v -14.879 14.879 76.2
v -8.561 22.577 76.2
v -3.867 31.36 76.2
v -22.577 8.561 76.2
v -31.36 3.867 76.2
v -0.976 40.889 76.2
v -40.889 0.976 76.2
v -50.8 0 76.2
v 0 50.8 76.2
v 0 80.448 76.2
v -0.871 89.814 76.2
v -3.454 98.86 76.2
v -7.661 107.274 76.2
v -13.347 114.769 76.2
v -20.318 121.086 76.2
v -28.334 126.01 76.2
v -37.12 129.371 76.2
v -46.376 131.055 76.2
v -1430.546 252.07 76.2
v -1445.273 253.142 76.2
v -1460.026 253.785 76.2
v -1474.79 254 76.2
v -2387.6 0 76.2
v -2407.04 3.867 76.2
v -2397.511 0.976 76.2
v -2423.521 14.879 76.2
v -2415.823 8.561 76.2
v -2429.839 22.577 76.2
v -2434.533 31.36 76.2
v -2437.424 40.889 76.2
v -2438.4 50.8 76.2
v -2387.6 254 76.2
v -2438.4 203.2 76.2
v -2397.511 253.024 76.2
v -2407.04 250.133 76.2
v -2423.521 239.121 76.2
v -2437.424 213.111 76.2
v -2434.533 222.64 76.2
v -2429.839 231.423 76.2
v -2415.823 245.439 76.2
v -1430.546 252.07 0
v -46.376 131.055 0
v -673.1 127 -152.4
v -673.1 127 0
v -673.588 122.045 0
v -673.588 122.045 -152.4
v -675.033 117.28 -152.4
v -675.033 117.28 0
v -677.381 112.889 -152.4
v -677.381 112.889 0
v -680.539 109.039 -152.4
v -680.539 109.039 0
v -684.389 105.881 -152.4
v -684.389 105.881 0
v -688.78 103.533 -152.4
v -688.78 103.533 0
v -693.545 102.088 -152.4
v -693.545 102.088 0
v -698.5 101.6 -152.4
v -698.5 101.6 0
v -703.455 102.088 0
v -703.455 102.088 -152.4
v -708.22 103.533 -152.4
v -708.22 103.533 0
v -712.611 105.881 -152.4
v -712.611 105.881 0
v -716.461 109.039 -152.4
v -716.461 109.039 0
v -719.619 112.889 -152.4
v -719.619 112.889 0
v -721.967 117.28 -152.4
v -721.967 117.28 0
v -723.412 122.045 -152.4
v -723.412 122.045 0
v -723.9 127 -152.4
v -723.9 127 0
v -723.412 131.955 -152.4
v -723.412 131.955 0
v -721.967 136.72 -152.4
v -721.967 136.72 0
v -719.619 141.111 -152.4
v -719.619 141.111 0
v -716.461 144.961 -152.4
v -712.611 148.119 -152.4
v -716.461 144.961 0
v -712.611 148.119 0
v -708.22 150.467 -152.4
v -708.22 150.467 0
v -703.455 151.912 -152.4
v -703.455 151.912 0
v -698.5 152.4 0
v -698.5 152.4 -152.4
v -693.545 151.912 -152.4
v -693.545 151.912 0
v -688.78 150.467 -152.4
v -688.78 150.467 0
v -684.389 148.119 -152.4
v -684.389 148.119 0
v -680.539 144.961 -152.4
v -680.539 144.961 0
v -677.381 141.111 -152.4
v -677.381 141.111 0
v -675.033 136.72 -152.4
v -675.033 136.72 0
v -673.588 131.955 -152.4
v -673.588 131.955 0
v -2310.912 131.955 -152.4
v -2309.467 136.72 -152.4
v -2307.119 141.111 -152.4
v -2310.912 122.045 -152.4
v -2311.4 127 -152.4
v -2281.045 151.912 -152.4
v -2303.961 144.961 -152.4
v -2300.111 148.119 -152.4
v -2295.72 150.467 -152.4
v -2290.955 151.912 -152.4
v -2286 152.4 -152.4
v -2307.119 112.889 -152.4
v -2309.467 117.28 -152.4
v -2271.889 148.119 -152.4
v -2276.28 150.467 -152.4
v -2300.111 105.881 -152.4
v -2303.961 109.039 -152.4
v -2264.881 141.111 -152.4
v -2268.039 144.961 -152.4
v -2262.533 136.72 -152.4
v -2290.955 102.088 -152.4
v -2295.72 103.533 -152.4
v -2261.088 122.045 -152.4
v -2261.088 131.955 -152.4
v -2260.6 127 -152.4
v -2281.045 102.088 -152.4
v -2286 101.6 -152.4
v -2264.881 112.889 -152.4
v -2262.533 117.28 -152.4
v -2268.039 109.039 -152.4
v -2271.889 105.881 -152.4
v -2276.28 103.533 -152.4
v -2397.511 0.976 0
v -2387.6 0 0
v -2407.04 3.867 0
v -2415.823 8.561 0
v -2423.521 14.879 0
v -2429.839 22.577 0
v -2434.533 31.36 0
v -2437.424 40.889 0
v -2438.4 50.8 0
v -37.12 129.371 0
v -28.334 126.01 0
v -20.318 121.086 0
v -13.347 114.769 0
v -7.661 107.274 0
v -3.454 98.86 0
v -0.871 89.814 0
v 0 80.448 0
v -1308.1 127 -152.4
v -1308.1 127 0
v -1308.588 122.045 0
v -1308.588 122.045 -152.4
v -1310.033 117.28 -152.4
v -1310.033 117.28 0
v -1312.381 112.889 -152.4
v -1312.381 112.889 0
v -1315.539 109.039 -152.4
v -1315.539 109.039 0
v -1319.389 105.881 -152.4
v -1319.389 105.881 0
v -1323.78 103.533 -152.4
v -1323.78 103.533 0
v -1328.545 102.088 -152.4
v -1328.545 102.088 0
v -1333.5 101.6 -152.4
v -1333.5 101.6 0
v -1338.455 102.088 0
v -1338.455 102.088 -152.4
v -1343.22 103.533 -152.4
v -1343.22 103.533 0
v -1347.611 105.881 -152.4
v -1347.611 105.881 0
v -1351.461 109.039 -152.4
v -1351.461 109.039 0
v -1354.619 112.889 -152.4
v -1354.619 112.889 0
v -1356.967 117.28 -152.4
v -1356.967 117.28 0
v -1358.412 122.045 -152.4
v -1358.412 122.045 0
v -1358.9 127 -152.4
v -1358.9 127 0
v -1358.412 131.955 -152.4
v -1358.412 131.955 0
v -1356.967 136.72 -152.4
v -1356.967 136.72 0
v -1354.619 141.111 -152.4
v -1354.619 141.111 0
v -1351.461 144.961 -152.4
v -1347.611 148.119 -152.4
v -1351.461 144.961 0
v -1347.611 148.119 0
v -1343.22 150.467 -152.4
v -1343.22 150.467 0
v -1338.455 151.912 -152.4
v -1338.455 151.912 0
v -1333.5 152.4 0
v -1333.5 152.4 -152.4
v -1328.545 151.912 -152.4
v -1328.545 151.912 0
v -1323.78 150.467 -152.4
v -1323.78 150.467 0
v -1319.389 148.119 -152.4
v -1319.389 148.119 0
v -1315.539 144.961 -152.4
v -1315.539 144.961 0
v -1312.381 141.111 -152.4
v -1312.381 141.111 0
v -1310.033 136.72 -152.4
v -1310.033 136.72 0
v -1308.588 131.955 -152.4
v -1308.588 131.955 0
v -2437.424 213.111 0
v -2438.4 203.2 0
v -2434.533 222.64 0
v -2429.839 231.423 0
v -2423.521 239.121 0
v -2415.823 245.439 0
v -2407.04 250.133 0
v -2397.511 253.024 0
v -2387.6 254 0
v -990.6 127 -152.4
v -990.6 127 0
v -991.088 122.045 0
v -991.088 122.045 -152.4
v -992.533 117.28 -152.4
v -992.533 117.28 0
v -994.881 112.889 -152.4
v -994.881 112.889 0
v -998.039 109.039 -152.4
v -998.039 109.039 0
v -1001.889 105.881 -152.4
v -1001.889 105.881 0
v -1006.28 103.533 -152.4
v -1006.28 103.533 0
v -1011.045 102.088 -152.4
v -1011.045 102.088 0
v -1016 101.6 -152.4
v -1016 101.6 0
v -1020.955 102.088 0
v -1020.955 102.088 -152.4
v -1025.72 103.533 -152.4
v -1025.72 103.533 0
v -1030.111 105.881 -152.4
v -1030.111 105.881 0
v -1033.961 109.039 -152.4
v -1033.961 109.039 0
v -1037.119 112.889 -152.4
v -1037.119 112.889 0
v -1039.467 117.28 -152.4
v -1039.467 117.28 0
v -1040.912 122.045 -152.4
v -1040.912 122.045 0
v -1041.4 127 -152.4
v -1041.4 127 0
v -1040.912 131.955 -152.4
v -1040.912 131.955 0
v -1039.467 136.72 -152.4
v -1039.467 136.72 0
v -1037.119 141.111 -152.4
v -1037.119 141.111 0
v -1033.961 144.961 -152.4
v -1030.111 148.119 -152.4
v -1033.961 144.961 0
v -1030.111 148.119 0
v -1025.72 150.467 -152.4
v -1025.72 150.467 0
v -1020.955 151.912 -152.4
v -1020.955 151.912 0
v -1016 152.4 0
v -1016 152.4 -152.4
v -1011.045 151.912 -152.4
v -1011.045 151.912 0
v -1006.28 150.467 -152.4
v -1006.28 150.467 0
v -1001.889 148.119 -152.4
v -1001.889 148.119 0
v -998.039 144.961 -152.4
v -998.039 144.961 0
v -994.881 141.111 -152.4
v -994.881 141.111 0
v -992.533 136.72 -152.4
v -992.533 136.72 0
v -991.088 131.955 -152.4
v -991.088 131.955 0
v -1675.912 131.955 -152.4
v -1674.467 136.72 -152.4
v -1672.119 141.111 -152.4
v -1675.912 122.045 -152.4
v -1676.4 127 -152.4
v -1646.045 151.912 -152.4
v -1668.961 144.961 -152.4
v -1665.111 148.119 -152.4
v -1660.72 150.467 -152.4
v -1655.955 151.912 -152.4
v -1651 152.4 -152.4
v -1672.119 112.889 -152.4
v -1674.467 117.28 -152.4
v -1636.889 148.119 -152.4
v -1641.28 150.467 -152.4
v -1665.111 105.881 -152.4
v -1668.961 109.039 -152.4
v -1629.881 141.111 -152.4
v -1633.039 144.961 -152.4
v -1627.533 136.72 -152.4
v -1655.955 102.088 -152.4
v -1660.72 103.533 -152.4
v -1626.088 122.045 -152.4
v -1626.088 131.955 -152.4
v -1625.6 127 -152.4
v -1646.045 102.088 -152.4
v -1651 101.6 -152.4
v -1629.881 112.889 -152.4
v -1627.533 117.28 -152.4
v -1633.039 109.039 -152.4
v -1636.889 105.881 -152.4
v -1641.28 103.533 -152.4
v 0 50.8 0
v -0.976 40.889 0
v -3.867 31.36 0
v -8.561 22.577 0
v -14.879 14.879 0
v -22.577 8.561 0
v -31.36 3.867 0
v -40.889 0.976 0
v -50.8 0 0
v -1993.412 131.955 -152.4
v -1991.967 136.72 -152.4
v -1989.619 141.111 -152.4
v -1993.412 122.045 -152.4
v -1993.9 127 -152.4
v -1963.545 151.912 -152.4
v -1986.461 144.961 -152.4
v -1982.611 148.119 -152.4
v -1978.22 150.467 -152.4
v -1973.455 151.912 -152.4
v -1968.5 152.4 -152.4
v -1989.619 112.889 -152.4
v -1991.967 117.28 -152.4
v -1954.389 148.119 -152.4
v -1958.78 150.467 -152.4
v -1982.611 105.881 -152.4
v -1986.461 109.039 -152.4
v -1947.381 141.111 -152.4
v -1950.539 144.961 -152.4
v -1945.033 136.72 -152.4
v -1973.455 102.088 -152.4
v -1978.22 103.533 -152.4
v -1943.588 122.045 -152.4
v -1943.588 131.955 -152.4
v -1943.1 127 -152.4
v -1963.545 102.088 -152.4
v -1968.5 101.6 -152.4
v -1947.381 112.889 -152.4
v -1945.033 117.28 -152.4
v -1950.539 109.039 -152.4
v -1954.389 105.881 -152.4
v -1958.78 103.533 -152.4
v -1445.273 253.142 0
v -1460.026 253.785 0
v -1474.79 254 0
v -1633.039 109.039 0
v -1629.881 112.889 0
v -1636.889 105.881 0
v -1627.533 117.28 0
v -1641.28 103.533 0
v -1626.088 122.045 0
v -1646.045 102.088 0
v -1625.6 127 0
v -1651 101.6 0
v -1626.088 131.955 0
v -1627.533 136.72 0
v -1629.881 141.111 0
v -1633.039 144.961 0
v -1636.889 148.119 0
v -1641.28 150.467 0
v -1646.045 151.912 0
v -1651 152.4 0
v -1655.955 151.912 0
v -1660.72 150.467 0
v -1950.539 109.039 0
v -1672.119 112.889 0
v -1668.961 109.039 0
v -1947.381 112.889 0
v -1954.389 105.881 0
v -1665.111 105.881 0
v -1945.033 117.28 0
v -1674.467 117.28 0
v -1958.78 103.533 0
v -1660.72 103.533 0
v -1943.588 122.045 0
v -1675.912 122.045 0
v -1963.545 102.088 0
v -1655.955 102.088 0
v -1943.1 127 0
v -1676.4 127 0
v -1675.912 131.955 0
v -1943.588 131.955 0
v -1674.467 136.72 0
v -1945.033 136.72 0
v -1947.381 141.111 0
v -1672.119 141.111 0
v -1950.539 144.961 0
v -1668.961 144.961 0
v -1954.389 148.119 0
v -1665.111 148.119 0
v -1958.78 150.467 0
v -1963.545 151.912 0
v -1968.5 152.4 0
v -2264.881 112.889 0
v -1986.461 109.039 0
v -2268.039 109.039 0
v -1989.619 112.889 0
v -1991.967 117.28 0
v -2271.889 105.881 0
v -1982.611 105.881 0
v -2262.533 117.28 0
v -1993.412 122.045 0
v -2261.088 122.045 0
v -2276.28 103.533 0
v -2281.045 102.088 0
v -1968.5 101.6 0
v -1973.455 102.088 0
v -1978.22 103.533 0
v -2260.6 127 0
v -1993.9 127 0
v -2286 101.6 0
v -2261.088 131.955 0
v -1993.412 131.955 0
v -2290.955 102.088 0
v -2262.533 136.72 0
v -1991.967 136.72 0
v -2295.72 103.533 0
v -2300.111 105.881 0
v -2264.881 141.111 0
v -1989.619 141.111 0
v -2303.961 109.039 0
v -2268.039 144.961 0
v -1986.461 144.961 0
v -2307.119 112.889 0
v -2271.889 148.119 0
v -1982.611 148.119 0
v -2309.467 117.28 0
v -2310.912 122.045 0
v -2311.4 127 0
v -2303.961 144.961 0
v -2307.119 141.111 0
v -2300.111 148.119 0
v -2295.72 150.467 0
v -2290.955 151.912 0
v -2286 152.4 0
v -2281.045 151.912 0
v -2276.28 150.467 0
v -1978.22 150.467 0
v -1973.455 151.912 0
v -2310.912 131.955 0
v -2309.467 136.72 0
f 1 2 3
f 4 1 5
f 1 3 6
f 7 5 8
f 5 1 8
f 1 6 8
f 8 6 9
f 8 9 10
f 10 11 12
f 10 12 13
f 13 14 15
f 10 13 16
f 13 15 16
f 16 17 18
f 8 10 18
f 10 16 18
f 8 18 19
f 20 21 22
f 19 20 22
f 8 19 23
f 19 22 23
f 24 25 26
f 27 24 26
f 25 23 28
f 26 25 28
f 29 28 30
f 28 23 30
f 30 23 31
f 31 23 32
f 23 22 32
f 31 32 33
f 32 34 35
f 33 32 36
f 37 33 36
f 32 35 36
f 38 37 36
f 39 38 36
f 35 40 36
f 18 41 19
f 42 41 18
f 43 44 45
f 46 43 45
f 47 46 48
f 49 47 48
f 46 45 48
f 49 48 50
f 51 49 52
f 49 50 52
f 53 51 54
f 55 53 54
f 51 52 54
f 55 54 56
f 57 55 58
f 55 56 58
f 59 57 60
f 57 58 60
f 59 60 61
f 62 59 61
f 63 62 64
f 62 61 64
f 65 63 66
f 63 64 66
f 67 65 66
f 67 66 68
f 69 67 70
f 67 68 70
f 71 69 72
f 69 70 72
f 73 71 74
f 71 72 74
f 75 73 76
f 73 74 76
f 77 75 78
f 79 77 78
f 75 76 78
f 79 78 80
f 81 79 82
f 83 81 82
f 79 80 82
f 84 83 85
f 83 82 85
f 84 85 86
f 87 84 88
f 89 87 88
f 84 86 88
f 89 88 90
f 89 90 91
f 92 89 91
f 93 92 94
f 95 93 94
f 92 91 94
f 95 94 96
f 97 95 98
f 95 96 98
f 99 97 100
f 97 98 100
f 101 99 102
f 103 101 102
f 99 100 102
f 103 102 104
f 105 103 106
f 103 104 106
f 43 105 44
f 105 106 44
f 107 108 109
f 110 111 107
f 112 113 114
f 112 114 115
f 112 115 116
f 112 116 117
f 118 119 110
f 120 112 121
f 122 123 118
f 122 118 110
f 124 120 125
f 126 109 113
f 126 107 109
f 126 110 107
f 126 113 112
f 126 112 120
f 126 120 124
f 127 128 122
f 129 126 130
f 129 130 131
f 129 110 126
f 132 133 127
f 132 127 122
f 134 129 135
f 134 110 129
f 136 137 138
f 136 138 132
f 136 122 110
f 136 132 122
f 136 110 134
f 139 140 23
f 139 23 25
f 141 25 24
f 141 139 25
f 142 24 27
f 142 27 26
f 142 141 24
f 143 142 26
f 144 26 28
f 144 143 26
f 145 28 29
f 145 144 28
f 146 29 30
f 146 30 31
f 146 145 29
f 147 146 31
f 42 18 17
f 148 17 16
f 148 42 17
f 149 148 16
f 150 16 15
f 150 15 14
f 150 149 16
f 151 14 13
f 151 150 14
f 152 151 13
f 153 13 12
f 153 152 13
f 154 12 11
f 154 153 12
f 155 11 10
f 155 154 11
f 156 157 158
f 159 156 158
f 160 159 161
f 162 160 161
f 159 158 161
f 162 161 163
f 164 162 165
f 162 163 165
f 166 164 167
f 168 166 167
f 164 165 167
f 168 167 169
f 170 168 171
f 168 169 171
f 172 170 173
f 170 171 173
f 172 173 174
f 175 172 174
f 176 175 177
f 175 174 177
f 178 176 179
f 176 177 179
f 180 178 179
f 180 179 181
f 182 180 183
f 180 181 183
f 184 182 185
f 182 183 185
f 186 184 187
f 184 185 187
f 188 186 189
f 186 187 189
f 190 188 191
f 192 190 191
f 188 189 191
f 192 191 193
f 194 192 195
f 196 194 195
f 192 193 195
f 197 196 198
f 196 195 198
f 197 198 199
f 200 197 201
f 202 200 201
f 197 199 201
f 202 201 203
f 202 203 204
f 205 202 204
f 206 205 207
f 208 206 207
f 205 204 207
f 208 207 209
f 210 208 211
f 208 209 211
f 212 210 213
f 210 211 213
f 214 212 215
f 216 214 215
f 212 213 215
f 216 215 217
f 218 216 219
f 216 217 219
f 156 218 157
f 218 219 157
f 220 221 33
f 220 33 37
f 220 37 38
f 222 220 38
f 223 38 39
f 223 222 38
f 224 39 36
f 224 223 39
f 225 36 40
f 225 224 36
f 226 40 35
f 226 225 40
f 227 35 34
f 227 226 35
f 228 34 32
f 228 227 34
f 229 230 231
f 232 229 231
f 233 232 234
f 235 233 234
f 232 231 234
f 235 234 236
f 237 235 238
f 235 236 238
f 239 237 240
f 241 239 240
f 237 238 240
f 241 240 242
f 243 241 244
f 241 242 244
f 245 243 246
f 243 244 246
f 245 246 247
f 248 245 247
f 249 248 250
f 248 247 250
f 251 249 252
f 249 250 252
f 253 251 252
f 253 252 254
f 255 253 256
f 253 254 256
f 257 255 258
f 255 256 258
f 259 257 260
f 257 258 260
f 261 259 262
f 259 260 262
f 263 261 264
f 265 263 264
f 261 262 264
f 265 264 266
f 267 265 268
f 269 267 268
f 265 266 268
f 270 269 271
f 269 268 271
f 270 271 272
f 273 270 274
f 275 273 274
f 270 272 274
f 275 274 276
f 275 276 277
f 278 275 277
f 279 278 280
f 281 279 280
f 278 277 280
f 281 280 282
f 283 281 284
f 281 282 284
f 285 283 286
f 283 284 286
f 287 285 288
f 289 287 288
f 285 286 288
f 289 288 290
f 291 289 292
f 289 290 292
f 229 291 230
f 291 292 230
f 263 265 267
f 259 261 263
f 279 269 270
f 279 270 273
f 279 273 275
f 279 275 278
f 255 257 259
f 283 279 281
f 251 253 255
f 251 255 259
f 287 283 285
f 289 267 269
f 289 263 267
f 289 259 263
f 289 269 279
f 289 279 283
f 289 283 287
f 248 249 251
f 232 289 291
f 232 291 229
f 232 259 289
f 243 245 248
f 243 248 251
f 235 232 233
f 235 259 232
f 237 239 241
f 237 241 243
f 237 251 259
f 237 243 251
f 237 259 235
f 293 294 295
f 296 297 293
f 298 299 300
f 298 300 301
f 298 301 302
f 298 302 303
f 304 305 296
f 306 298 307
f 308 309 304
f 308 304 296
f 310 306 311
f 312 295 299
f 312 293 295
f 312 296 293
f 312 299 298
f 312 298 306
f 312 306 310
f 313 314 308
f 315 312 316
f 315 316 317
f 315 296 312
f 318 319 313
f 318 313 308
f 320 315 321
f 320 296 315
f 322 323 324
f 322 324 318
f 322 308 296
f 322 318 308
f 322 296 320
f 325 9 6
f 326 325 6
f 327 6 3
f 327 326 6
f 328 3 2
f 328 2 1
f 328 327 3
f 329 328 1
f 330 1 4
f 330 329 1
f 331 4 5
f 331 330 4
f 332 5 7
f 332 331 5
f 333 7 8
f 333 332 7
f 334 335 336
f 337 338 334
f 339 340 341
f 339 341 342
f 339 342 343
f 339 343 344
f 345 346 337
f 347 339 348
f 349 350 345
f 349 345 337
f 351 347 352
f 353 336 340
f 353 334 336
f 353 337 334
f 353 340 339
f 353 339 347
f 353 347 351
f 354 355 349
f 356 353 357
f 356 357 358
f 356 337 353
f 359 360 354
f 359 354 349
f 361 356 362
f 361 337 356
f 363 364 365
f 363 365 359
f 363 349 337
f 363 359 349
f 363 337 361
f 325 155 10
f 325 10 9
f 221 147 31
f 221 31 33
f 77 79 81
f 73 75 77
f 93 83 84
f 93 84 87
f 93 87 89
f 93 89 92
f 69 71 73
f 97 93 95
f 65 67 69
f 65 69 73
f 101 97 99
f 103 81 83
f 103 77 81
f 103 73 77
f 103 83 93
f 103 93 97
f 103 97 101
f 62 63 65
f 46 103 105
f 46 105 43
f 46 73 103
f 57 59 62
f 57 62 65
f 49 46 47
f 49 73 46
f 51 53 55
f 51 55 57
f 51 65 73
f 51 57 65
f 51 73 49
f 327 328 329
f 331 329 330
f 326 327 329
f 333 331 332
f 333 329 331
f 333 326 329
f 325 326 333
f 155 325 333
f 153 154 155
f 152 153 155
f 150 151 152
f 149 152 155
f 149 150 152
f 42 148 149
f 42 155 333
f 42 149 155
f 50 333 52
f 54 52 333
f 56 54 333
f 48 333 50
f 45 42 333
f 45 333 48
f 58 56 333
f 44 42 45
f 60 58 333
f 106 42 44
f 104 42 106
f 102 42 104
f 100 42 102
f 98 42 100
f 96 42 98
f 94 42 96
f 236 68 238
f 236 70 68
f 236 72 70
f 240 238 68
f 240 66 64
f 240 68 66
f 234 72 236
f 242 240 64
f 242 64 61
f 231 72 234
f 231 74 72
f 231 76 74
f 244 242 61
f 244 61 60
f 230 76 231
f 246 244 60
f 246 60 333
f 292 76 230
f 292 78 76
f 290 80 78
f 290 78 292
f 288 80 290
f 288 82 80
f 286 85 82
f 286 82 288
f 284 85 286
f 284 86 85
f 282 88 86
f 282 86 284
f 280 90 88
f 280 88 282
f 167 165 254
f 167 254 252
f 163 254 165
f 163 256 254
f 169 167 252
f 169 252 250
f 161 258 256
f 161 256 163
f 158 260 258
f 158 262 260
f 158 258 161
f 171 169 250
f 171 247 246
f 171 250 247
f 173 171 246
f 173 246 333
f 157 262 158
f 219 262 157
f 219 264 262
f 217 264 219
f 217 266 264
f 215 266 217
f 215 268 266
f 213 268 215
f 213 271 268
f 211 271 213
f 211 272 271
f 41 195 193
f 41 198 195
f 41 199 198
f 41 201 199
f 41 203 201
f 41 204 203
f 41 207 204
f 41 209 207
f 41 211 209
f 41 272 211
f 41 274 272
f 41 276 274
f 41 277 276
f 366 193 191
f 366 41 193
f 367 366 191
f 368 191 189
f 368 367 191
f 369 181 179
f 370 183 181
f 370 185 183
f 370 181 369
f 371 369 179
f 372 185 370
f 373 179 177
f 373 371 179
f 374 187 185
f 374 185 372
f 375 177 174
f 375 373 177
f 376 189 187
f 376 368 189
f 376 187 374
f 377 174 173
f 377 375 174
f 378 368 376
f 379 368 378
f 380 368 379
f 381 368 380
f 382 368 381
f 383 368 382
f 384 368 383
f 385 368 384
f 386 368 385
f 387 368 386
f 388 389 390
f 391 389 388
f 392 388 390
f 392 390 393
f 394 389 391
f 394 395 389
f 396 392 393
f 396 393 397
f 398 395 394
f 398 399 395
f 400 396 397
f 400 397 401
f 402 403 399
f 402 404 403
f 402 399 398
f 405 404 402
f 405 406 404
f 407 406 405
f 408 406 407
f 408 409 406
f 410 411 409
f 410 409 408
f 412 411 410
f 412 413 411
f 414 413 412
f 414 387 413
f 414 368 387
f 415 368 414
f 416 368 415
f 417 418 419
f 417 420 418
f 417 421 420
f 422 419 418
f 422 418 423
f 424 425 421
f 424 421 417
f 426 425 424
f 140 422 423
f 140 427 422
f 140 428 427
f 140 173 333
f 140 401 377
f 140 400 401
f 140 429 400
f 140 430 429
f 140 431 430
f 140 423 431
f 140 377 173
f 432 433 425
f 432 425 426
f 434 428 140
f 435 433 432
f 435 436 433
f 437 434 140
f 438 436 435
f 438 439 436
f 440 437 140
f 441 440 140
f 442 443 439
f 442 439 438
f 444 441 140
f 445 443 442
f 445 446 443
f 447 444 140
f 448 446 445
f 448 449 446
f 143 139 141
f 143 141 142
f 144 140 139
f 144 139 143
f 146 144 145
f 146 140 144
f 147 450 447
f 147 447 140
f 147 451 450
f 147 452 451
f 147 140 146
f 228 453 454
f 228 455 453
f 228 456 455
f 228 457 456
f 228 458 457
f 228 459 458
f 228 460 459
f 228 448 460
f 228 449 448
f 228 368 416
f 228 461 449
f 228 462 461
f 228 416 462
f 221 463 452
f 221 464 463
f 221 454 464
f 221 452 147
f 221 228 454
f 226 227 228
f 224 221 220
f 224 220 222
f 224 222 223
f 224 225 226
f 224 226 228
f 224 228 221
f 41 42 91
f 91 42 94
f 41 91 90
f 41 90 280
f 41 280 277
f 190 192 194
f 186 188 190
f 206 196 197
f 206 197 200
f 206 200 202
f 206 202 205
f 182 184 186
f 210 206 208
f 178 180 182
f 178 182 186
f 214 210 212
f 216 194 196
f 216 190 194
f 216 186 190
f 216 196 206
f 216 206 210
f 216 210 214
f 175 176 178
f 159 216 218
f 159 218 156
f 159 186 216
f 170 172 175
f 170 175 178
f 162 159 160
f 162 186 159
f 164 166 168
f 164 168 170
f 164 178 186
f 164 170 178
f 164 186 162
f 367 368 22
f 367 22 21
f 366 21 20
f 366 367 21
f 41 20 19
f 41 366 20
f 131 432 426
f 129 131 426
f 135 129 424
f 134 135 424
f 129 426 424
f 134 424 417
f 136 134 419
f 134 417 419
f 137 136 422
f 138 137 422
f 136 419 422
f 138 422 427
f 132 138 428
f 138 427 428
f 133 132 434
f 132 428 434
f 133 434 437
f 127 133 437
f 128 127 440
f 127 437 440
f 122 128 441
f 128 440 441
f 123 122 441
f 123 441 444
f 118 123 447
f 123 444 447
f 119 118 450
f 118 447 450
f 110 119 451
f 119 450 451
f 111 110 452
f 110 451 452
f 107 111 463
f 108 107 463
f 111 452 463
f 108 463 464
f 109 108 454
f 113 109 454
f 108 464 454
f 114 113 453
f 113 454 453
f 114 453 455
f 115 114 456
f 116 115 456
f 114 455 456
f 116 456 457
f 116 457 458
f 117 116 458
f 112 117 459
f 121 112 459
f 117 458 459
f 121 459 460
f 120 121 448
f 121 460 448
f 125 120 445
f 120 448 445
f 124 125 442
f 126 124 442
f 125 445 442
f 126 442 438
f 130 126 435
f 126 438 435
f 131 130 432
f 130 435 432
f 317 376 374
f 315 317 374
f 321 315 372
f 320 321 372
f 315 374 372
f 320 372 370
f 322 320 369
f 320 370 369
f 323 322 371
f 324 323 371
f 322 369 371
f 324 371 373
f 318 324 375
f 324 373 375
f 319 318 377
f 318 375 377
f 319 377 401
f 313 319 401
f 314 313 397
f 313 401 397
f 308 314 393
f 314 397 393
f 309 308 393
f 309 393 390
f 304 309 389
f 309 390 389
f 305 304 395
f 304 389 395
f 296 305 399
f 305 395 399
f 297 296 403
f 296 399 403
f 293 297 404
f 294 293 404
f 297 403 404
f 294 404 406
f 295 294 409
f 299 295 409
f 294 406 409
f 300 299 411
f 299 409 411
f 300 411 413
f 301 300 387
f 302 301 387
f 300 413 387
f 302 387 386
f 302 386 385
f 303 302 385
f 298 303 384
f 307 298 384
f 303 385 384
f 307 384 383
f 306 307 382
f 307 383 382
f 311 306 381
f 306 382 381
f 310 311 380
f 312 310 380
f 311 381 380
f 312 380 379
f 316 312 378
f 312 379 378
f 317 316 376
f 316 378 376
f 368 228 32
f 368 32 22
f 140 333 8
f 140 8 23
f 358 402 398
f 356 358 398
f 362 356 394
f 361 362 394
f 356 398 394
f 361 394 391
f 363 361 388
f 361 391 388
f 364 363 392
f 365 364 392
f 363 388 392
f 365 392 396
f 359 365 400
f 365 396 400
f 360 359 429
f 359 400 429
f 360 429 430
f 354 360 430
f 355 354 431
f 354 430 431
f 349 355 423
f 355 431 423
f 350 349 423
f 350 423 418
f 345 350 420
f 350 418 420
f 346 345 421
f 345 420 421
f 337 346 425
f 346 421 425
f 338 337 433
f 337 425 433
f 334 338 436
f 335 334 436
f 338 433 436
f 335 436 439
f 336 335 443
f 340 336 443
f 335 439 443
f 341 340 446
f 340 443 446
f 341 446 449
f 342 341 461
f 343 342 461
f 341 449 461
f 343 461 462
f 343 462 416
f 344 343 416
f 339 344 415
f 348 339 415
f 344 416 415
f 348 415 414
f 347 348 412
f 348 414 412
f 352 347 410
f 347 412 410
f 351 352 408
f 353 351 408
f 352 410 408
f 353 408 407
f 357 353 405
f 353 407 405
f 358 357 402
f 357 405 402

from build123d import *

# Parameters (mm, degrees)
BOSS_EXTRUDE1_DEPTH = 76.2
SKETCH2_R           = 25.4
BOSS_EXTRUDE2_DEPTH = 152.4
LPATTERN1_COUNT     = 6
LPATTERN1_PITCH     = 317.5


with BuildPart() as part:
    # Sketch1 → Boss-Extrude1 (new body)
    with BuildSketch(Plane.XY):
        with BuildLine():
            Line((-50.8, 0), (-2387.6, 0))
            ThreePointArc((-2387.6, 0), (-2423.521024484, 14.878975516), (-2438.4, 50.8))
            Line((-2438.4, 50.8), (-2438.4, 203.2))
            ThreePointArc((-2438.4, 203.2), (-2423.521024484, 239.121024484), (-2387.6, 254))
            Line((-2387.6, 254), (-1474.790405971, 254))
            ThreePointArc((-1474.790405971, 254), (-1452.64706645, 253.517164749), (-1430.545819782, 252.06957683))
            Line((-1430.545819782, 252.06957683), (-46.375541381, 131.054514896))
            ThreePointArc((-46.375541381, 131.054514896), (-13.34734657, 114.768669536), (0, 80.447557213))
            Line((0, 80.447557213), (0, 50.8))
            ThreePointArc((0, 50.8), (-14.878975516, 14.878975516), (-50.8, 0))
        make_face()
    extrude(amount=BOSS_EXTRUDE1_DEPTH)

    # Sketch2 → Boss-Extrude2 (add)
    with BuildSketch(Plane(origin=(0, 0, 0), x_dir=(-1, 0, 0), z_dir=(0, 0, -1))):
        with Locations(Location((2286, 127, 0), (0, 0, 180))):
            Circle(SKETCH2_R)
    boss_extrude2 = extrude(amount=BOSS_EXTRUDE2_DEPTH)

    # LPattern1: Boss-Extrude2 ×6
    with Locations(*[(i * LPATTERN1_PITCH, 0, 0) for i in range(1, LPATTERN1_COUNT)]):
        add(boss_extrude2)


solid = part.part
